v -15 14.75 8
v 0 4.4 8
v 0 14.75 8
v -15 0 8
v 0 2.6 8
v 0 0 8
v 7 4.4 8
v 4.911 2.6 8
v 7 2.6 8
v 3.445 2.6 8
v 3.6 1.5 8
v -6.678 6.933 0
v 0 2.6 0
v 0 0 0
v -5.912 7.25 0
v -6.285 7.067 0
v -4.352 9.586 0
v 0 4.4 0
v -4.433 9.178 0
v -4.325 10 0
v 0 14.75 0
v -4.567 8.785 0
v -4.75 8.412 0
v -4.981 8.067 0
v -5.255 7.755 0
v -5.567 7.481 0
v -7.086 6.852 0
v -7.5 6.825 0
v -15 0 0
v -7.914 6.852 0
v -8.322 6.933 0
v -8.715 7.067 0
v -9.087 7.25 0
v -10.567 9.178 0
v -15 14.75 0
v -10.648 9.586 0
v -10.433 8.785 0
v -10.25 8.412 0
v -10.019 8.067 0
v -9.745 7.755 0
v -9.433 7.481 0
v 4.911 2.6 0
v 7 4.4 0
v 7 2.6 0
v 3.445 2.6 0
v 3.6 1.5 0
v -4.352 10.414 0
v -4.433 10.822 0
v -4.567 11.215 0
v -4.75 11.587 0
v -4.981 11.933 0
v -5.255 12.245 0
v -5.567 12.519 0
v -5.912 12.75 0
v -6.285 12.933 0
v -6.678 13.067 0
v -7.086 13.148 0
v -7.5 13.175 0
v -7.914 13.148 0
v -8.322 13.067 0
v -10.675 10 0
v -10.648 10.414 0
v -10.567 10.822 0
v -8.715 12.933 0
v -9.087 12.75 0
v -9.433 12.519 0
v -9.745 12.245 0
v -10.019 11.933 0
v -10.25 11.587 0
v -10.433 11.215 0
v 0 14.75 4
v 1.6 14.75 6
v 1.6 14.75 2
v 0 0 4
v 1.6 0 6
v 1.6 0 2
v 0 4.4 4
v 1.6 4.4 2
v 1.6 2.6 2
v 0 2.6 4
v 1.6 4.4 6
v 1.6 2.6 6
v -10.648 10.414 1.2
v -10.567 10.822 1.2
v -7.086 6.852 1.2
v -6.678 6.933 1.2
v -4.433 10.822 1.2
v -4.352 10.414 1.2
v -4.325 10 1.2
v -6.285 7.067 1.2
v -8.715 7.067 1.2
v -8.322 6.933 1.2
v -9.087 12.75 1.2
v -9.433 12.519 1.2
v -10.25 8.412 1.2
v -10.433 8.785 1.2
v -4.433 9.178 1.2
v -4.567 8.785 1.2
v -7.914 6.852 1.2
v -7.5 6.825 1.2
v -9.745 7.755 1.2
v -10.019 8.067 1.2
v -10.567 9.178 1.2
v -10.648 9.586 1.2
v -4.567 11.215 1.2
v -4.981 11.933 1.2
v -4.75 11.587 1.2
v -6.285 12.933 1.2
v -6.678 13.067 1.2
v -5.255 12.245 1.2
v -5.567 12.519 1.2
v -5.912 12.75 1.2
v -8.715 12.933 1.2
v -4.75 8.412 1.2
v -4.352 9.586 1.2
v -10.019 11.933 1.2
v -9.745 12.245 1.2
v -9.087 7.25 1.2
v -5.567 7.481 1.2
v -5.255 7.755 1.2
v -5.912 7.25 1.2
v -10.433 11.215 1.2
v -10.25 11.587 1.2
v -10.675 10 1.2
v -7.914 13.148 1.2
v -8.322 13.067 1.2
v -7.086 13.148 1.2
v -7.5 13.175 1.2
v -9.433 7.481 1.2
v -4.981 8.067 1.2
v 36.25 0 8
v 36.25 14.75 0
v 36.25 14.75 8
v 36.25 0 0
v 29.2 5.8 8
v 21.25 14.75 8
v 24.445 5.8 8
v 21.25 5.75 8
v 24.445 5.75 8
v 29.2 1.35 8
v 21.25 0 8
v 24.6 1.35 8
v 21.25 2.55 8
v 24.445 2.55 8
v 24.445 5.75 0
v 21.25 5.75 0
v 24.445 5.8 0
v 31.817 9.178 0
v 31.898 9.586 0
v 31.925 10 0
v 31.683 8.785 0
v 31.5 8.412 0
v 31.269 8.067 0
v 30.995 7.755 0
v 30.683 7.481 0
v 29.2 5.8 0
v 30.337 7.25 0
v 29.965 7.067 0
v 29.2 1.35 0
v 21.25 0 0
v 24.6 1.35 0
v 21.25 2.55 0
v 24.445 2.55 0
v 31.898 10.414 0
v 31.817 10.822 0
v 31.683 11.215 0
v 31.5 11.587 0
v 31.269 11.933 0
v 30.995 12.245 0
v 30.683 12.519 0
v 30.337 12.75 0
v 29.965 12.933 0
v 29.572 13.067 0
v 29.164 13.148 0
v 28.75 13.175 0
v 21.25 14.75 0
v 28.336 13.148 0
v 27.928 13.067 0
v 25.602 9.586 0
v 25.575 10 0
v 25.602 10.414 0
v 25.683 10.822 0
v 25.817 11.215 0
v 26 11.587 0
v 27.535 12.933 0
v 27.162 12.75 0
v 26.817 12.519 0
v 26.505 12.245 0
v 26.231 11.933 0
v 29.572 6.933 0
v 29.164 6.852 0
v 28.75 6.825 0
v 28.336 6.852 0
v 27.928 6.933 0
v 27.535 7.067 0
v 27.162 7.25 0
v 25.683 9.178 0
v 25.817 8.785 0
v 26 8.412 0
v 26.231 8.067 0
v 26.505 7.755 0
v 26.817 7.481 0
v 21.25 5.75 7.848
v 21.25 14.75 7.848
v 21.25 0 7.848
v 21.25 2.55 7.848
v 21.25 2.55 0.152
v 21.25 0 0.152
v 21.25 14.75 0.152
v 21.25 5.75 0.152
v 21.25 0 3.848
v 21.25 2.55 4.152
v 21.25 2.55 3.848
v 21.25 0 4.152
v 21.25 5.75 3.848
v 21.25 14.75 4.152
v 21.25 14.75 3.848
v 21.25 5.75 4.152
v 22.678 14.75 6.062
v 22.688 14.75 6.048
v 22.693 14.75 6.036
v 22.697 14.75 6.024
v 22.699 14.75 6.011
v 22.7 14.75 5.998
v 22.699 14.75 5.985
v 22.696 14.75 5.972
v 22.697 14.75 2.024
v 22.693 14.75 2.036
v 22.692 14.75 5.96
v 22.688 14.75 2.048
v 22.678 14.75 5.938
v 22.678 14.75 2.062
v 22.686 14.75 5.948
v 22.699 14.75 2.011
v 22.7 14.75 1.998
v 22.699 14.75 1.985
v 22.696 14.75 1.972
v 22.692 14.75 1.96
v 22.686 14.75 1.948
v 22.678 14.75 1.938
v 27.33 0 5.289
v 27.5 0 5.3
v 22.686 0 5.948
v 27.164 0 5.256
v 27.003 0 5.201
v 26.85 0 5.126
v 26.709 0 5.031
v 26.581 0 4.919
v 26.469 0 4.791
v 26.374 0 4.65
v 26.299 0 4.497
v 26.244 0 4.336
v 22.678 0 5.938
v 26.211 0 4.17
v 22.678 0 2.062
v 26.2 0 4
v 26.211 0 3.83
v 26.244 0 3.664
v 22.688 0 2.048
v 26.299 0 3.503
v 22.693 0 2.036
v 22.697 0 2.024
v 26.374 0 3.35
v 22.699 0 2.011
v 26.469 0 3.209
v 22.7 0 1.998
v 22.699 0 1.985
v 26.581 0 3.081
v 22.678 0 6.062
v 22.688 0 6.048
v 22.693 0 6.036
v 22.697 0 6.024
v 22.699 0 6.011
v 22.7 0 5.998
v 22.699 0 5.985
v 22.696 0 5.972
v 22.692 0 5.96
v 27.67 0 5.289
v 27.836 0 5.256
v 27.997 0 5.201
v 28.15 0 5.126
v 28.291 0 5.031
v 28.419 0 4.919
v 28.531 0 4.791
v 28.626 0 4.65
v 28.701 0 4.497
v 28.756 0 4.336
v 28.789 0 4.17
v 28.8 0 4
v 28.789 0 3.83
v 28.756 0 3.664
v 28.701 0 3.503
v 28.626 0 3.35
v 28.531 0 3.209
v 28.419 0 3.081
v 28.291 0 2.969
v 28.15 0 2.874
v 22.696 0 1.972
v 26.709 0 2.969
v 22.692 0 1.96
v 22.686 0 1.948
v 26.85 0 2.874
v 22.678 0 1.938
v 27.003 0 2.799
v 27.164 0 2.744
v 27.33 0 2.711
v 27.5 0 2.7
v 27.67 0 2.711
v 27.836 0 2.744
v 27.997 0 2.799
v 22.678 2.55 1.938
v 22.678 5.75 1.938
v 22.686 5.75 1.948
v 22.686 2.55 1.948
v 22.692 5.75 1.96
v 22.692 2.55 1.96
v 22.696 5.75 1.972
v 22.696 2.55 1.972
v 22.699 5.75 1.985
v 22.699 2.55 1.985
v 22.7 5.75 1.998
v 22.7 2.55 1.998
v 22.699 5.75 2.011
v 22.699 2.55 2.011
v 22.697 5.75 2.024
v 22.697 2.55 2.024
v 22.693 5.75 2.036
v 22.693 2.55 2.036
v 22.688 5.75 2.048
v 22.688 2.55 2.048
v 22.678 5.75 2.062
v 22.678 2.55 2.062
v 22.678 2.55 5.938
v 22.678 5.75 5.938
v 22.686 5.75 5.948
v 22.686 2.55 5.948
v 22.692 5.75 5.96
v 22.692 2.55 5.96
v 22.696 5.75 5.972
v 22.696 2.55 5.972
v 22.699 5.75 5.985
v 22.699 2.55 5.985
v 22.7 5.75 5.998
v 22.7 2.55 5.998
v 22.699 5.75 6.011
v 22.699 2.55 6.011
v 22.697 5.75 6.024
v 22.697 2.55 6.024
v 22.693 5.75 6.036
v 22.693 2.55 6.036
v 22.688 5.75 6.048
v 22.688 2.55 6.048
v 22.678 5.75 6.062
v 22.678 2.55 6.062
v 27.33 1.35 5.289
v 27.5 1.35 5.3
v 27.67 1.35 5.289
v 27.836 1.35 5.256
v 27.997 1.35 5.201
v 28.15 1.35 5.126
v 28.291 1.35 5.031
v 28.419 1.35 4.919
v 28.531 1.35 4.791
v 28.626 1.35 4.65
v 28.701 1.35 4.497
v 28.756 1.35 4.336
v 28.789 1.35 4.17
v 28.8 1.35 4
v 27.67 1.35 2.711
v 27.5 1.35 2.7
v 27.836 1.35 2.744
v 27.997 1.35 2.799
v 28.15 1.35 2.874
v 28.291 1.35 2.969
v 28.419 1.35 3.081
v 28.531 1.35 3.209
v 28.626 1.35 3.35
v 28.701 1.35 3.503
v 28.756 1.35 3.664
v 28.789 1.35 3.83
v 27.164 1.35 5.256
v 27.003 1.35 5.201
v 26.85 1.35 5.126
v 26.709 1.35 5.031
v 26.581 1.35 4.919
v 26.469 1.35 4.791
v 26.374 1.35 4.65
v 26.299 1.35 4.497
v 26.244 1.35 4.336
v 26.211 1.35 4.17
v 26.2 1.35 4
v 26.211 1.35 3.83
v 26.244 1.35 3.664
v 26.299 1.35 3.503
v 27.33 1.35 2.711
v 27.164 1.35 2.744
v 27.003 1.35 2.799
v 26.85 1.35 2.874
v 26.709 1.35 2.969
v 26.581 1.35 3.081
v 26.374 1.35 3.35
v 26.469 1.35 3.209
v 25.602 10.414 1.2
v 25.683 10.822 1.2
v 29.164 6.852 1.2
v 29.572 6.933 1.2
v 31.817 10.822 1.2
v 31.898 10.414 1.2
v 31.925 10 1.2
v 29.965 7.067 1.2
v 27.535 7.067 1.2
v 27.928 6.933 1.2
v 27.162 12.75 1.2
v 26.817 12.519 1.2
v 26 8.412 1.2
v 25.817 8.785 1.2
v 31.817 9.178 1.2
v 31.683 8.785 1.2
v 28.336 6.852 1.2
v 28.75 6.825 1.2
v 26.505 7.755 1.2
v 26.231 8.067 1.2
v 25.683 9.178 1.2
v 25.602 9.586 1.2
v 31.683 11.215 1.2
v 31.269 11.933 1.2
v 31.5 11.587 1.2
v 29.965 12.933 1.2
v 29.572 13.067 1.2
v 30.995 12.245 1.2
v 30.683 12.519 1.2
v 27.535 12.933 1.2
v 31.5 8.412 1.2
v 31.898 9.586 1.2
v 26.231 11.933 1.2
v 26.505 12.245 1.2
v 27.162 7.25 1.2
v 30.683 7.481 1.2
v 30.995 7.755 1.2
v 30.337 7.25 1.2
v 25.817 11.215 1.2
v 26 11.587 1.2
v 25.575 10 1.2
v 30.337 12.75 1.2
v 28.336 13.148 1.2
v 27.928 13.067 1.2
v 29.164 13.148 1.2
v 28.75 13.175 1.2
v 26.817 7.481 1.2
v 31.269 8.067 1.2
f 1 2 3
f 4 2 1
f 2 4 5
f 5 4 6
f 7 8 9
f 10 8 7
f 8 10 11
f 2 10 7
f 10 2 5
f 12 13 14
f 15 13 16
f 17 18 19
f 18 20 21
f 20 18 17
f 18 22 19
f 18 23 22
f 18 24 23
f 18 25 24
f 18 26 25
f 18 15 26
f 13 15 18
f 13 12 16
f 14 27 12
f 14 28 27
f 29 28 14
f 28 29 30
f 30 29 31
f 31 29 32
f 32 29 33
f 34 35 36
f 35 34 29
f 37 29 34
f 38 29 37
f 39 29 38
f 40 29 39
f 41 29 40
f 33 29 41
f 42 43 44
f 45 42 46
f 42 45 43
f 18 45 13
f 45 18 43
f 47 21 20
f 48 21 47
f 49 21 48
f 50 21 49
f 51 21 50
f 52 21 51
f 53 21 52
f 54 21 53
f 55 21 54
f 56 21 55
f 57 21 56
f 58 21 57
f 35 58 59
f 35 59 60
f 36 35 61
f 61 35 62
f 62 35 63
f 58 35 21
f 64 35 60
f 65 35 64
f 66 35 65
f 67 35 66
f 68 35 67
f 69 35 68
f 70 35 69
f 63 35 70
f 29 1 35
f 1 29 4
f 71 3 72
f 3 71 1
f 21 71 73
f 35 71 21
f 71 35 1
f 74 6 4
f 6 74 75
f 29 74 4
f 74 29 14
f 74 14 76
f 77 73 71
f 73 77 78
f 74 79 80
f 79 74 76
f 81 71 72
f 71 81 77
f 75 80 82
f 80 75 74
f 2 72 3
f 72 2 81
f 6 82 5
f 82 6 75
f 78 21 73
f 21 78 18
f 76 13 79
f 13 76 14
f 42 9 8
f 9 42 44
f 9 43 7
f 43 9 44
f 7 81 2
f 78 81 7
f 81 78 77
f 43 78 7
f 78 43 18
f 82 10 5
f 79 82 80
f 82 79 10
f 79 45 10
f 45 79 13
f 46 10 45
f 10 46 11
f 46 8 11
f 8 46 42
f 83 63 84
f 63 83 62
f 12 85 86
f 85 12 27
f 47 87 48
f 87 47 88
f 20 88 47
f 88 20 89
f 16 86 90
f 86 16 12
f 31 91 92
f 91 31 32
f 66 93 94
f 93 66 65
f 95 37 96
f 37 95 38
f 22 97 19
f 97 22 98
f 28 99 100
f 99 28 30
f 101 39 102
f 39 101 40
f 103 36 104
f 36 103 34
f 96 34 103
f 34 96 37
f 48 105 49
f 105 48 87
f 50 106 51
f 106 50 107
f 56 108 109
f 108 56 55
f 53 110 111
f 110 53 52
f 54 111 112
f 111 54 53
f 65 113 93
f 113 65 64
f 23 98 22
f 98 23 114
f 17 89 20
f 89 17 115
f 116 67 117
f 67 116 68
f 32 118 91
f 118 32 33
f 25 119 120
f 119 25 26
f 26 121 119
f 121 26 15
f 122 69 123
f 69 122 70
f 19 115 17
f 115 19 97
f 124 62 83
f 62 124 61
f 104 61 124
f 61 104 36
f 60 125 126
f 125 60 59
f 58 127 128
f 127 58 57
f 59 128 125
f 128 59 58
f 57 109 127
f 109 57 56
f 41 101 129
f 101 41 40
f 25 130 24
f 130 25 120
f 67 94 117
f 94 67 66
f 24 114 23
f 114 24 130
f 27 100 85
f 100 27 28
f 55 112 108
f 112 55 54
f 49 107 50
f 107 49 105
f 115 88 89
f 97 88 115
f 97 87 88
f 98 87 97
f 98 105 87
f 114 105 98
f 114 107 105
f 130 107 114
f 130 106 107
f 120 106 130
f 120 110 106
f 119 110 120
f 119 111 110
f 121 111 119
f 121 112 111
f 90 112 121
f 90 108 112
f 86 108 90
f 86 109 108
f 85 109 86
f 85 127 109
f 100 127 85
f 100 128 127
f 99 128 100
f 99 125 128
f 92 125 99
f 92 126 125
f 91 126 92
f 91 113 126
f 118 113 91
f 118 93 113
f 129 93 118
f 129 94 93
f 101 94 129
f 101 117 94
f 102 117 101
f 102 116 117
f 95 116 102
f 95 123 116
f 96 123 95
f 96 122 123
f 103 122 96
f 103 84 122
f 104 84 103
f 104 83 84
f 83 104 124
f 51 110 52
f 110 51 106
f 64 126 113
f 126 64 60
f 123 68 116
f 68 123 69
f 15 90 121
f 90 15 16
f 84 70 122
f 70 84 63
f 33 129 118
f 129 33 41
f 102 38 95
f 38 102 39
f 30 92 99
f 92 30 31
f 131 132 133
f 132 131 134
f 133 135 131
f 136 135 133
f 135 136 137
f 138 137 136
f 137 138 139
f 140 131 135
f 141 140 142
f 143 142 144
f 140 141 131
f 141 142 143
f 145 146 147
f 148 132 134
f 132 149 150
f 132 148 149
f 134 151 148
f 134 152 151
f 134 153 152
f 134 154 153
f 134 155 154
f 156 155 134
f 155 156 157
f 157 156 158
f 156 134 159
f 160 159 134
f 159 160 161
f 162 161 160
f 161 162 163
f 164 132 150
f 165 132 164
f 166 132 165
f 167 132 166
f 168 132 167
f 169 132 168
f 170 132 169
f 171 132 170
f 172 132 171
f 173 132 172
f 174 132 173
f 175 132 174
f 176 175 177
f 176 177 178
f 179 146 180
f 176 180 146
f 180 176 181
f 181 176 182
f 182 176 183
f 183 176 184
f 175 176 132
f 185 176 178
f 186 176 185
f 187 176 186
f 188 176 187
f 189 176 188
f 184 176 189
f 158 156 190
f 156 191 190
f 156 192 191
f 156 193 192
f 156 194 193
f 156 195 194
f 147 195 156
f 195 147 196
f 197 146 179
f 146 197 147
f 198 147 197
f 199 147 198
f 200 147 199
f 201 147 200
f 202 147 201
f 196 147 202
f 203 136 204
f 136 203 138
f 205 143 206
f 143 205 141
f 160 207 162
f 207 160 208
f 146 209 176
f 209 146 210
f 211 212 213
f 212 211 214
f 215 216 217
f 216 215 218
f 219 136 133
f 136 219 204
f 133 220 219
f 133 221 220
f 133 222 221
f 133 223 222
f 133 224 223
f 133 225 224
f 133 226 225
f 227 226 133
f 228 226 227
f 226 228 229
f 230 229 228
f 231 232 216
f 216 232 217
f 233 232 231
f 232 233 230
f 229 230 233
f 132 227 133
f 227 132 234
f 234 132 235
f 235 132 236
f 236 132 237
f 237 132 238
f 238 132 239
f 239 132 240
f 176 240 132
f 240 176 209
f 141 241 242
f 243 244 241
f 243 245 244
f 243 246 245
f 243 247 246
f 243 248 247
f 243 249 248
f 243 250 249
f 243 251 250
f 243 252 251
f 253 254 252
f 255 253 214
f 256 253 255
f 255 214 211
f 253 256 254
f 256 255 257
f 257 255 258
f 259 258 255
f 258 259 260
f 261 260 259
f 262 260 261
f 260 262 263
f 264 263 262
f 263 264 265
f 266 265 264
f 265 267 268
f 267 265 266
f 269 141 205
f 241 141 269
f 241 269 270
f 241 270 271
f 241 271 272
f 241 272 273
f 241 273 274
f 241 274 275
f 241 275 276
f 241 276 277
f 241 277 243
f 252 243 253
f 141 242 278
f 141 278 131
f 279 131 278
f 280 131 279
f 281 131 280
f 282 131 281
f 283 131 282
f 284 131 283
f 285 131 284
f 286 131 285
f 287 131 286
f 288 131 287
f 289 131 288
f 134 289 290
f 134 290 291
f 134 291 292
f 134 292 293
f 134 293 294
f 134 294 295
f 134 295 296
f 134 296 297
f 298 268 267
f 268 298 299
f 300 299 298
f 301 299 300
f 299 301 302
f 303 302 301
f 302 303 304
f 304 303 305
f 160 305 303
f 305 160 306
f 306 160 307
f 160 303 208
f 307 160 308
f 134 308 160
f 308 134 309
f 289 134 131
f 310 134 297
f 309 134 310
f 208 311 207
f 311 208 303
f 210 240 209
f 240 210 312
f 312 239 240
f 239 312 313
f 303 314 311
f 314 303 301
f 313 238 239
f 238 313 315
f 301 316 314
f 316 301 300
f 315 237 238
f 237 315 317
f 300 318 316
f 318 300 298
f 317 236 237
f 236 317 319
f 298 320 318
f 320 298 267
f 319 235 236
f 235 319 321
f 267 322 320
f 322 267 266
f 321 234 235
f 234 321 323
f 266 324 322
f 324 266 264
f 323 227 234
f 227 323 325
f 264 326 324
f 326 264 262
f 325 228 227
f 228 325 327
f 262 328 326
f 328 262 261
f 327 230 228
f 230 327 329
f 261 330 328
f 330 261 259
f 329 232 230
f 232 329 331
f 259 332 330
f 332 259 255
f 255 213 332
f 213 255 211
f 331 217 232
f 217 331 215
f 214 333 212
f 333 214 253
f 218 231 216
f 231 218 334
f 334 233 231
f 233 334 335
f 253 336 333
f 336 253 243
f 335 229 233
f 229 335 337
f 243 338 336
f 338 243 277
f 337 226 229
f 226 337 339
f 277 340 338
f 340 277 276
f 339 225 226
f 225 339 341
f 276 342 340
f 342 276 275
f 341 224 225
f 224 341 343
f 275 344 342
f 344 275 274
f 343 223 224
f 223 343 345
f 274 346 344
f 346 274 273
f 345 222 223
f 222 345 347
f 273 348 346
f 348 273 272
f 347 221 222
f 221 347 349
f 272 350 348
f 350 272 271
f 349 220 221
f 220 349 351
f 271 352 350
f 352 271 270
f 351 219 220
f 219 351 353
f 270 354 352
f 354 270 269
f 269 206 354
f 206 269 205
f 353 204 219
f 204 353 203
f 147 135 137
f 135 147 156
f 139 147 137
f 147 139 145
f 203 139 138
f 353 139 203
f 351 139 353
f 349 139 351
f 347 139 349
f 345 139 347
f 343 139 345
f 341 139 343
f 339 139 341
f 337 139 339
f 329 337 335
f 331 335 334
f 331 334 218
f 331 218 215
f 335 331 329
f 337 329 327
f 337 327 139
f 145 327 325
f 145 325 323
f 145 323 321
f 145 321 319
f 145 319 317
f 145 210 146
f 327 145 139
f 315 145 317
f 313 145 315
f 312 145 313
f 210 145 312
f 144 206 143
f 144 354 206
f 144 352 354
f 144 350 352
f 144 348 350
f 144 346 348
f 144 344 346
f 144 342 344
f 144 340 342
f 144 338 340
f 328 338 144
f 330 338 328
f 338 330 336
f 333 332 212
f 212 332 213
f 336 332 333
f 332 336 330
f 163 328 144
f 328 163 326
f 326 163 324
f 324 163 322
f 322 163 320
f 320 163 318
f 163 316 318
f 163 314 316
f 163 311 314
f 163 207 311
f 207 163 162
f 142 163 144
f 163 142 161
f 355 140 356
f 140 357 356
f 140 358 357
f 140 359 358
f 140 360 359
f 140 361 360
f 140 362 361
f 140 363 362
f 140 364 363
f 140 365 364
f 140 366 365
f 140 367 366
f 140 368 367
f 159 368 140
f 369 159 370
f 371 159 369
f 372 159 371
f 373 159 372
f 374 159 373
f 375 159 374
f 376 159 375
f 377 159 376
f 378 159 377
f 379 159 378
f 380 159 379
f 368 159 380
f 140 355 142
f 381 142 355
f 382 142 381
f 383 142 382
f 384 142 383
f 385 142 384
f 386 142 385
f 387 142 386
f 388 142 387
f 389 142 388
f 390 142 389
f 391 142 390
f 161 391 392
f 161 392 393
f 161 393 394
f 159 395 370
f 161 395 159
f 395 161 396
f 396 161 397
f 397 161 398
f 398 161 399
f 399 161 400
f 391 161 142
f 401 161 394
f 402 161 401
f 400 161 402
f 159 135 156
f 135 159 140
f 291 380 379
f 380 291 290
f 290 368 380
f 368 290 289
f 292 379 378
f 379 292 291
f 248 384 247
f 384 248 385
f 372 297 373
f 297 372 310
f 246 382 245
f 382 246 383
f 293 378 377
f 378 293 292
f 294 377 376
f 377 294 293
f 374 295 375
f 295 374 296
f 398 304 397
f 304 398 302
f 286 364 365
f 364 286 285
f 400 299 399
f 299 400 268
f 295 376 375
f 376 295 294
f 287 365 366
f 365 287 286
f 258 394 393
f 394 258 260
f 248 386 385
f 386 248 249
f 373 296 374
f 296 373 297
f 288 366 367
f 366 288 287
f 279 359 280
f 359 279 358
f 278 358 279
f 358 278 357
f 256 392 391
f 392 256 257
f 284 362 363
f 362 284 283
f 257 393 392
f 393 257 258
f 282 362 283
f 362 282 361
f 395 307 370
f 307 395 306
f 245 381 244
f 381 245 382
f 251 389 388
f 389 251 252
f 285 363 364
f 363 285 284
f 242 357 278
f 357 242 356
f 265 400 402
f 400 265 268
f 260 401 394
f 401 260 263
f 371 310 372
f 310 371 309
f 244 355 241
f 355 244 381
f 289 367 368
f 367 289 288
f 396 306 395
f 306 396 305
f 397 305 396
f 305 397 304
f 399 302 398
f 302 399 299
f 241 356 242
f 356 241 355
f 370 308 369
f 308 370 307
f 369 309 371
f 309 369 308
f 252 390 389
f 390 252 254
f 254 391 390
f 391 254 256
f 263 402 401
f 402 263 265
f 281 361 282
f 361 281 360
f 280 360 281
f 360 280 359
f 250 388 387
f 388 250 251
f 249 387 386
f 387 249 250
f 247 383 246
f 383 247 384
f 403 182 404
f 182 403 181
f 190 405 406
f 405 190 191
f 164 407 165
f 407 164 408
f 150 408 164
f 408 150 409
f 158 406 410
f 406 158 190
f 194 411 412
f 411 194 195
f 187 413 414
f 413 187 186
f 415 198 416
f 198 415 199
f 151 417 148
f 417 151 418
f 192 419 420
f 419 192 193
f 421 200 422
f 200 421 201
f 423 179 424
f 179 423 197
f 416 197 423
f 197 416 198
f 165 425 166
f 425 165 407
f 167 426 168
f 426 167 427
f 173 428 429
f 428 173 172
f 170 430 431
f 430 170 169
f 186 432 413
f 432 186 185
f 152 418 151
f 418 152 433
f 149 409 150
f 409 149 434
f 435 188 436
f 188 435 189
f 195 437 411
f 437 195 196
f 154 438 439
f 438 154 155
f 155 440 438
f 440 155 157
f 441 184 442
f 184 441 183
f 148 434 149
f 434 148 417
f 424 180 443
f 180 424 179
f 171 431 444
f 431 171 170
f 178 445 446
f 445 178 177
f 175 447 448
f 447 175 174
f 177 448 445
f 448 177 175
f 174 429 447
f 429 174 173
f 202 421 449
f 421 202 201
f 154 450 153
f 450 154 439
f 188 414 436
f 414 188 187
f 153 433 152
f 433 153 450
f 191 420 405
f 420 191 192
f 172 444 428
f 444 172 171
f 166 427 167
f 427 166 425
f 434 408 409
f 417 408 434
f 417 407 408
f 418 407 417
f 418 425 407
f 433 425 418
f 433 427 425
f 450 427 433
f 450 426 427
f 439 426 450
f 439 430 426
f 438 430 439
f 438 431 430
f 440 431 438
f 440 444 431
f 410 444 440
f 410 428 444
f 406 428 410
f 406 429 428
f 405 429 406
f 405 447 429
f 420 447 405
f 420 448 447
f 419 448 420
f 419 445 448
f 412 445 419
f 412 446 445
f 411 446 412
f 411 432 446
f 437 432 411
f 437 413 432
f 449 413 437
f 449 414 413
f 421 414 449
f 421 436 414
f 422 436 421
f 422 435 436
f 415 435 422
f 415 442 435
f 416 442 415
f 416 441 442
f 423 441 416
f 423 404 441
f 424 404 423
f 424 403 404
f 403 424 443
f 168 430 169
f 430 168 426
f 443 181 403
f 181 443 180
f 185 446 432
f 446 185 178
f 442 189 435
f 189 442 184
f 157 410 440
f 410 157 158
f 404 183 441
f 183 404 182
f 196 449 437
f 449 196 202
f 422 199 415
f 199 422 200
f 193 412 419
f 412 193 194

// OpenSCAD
// abacus-link.scad — the AbacusLink modular-column joint + its test coupon
// ---------------------------------------------------------------------------
// SPEC: apps/web/docs/abacus-studio/modular-columns-spec.md
// TS MIRROR: src/components/create/abacus/abacus-link.ts (the derived chain and
// the fit guards; this file stays the source of truth for the GEOMETRY, exactly
// as abacus.scad does for the monolith).
//
// STATUS: unrendered. There is no headless OpenSCAD in this repo (see
// __tests__/export-defines.test.ts), so nothing here has been through the
// evaluator. Render `part="coupon"` in the studio or on the desktop before
// spending filament on it.
//
// WHY THIS IS A SEPARATE FILE. abacus.scad's captive-track geometry is the
// hardest-won thing in the model, and a seam never crosses a bead channel — so
// the joint can be designed, printed and measured entirely on its own. This
// file is that experiment. Once the coupon passes §9 of the spec, these modules
// get `include`d by abacus.scad rather than copied into it.
//
// THE ORIENTATION CONSTRAINT that shapes every decision below: the beads are
// captive and print in place, so the build orientation is FLAT (frame bottom on
// the bed) and is not negotiable. Therefore:
//   - anything prismatic in Z is free            (vertical walls print perfectly)
//   - anything within 45° of vertical is free    (self-supporting)
//   - anything else needs support, and support inside a snap fit is not a thing
// The chevron obeys the second rule; the latch obeys the first. Neither needs a
// single support interface.
//
// FRAME. The seam plane is x = 0. Module A is at x < 0 and presents the MALE
// face (chevron ridge + latch tongue, both reaching into +x). Module B starts at
// x = link_relief and presents the FEMALE face (chevron groove + latch slot).
// Every module is male on its right and female on its left, so they chain and
// the stack is loaded from one end. y runs from the outer wall at y = 0 inward;
// z is the slab height.
//
// ONE TONGUE PER STATION, NOT TWO. Doubling the tongues would double the clamp,
// but the release poke has to reach a tongue from the outer wall, and the second
// tongue's shoulder is exactly the material the second bore would have to drill
// through. So a seam gets two tongues by having two STATIONS — one at the front
// strip released from the front wall, one at the back strip released from the
// back wall. That is also what makes release two-handed, and two-handed is what
// makes it impossible by accident.

/* ===== the interface — FROZEN once a size class ships ===================== */
link_h        = 8;     // seam height = frame_h · S
link_pitch    = 15;    // modular col_pitch: bead 10 + 2·clearance + web 4.5
link_station  = 14.75; // Y depth of the station this coupon models (front strip)
                       // = border_w 7.0 + shelf 7.75. The monolith's 5.25 border
                       // gives a 13.0 strip, and 13.0 holds a latch OR a foot,
                       // not both — the foot-vs-slot assert below is what found
                       // that. Modular mode buys the extra 1.75 by widening the
                       // border, at +3.5 mm on the abacus's overall depth.

/* ---- chevron: Z registration and Z shear --------------------------------- */
// Two teeth across the height. The flank angle off vertical is
// atan(link_tooth_d / (link_h/link_teeth/2)) = 38.7° at these values — inside
// the 45° self-support limit with 6.3° to spare, in BOTH the ridge and the
// groove. Push link_tooth_d past link_h/(2·link_teeth) and the groove roof
// becomes an unprintable overhang; that is what the first assert is for.
link_teeth    = 2;
link_tooth_d  = 1.6;   // ridge protrusion into +x
link_back     = 0.6;   // profile backing, buried in A — keeps the polygon simple
link_fit      = 0.10;  // per-face groove clearance (what lets it go together)
link_relief   = 0.25;  // flat-face standoff: the chevron flanks are the ONLY
                       // contact, so nothing else can hold them off their seat

/* ---- cam latch: X preload, take-up, retention ---------------------------- */
// A cantilever along X springing in Y, prismatic in Z over the full height —
// support-free by construction, and 8 mm tall, so it is stiff about the axis
// that matters and compliant about the one it needs to be.
//
// The barb's proximal face is a ramp at link_ramp off the Y axis. That single
// angle does three jobs: it converts the spring's Y force into X clamp at
// 1/tan(ramp), it drives the seam shut so the ASSEMBLED clearance is zero
// whatever the manufactured clearance was, and — being below the PLA-on-PLA
// friction angle (~16.7°) — it self-locks, so load cannot back it out.
link_ramp     = 8;     // cam/retain ramp, degrees off the Y axis. SELF-LOCKING
                       // REQUIRES < ~16.7. Coupon sweep: 8 / 12 / 16.
link_lead     = 40;    // insertion lead-in, degrees off the X axis (shallow, so
                       // pushing two modules together is a kid-force operation)
link_beam_t   = 1.8;   // tongue thickness in Y
link_beam_l   = 12;    // tongue length in X — the stress lever. Shortening this
                       // raises clamp force as 1/L³ but beam stress as 1/L²;
                       // 12 mm keeps peak fibre stress ≈ 30 MPa, under PLA yield.
link_beam_x0  = -5;    // tongue root, inside A
link_beam_y0  = 2.6;   // tongue's near face, measured from the outer wall. The
                       // barb reaches 0.9 nearer still, so this sets the outer
                       // wall's remaining thickness (1.55 mm) — the wall the
                       // release bore goes through.
link_bump     = 1.1;   // barb height = the cam travel = the tolerance the joint
                       // can swallow (take-up = link_bump · tan(link_ramp)).
                       // NOTE the preload a seated seam holds comes from the
                       // travel REMAINING when the chevron bottoms — nominally
                       // half of this — not from the full height. The full
                       // height is the insertion peak. See linkMechanics().
link_slot     = 1.4;   // spring room on the tongue's far side. MUST exceed
                       // link_bump or the barb cannot deflect past the throat.
link_release  = 2.6;   // release-poke bore through the outer wall

/* ---- per-module stick-on foot -------------------------------------------- */
// Affordance, not obligation (spec §5): every module gets the pocket, you stick
// feet on as many as you want.
//
// The foot and the latch slot compete for the same strip, and the slot wins on
// X — it runs from the seam out to x = 8.2 of a 15 mm pitch, which leaves less
// clear width than even the smallest bumper needs. So they are separated in Y
// instead: latch inboard-of-the-wall, foot inboard of the latch. That is what
// sets link_station, and it caps the preset at 1/4" — the largest BUMPER_PRESETS
// entry that fits behind the slot in a widened strip.
link_foot     = true;
link_foot_w   = 6.35;  // 1/4"
link_foot_d   = 1.2;
link_foot_x   = 7.5;   // module-local — centred, since Y is what separates it
link_foot_y   = 10.0;

part = "coupon";       // coupon | male | female | assembled | ridge
$fn  = 48;

/* ===== derived ============================================================ */
link_th       = link_h / link_teeth;                  // one tooth's height
link_flank    = atan(link_tooth_d / (link_th / 2));   // chevron flank, off VERTICAL
link_beam_x1  = link_beam_x0 + link_beam_l;           // tongue tip
link_barb_x   = link_beam_x1 - 3.4;                   // where the barb bears
link_cam_run  = link_bump * tan(link_ramp);           // cam face's x-run
link_lead_run = link_bump / tan(link_lead);           // lead-in face's x-run
link_takeup   = link_cam_run;                         // X drawn per full travel
link_slot_end = link_beam_x1 + 1.2;                   // slot's far wall
link_bore_x   = link_beam_x1 - 0.5;                   // bore lands PAST the barb
// The two footprints that have to stay out of each other's way, as bounding
// boxes in the module's own frame: [x0, y0, x1, y1].
link_slot_bb  = [link_relief - 0.1,       link_beam_y0 - link_bump - 0.15,
                 link_slot_end,           link_beam_y0 + link_beam_t + link_slot];
link_foot_bb  = [link_foot_x - link_foot_w / 2, link_foot_y - link_foot_w / 2,
                 link_foot_x + link_foot_w / 2, link_foot_y + link_foot_w / 2];

/* ===== coherence floors =================================================== */
assert(link_tooth_d <= link_th / 2 + 0.001,
       "chevron flank steeper than 45° — the groove roof needs support. Lower link_tooth_d or raise link_teeth.");
assert(link_ramp > 0 && link_ramp < 16.7,
       "cam ramp outside the self-locking band (0 < ramp < atan(mu_PLA) ~ 16.7°)");
// Closing a link_fit normal gap on a flank inclined link_flank off vertical
// costs link_fit / cos(link_flank) of X travel. The flats have to stay clear of
// each other over at least that much, or they bottom out first and the chevron
// never seats — which loses the Z registration the markers depend on, silently.
assert(link_relief > link_fit / cos(link_flank) + 0.05,
       "flat relief too small — the seam faces would bottom out before the chevron flanks seat");
assert(link_takeup >= 0.12,
       "cam take-up under 0.12 mm cannot swallow a normal print's spread — raise link_bump or link_ramp");
assert(link_slot > link_bump + 0.2,
       "slot narrower than the barb's travel — the tongue would bind on insertion");
// The bore has to open into the slot BEYOND the shoulder. Drill it at or before
// the barb and it removes the very material the barb bears on — which is a
// silent failure: the part renders, prints, clicks, and holds nothing.
assert(link_bore_x - link_release / 2 > link_barb_x + link_lead_run,
       "release bore would eat the latch shoulder — move link_bore_x toward the tongue tip");
assert(link_beam_y0 - link_bump > 1.2,
       "outer wall left in front of the barb is thinner than a printable wall — raise link_beam_y0");
assert(link_slot_bb[3] < link_station,
       "latch slot runs past the station into the bead channel — raise link_station or shrink the tongue");
// Foot vs. latch. These two want the same strip, and the slot wins on X (it
// spans the seam out to link_slot_end, leaving less clear width than any bumper
// needs), so the only way past each other is Y. Stated as a real box-disjoint
// test rather than a one-axis check, because a one-axis check is what would let
// a future pitch/preset change quietly reintroduce the overlap.
link_bb_clear = 0.8;
assert(link_foot_bb[1] > link_slot_bb[3] + link_bb_clear ||
       link_foot_bb[3] < link_slot_bb[1] - link_bb_clear ||
       link_foot_bb[0] > link_slot_bb[2] + link_bb_clear ||
       link_foot_bb[2] < link_slot_bb[0] - link_bb_clear,
       "foot pocket overlaps the latch slot — move link_foot_y past the slot, shrink link_foot_w, or widen the station");
assert(link_foot_bb[0] > link_relief + 0.8 && link_foot_bb[2] < link_relief + link_pitch - 0.8 &&
       link_foot_bb[1] > 0.8 && link_foot_bb[3] < link_station - 0.8,
       "foot pocket runs off the module's solid strip — smaller link_foot_w, or a bigger pitch/station");

/* ===== chevron ============================================================ */
// XZ profile of the ridge, sitting on the seam plane: flat back buried in A,
// teeth reaching into +x. `each` is deliberately avoided so this parses on
// older evaluators.
function link_ridge_pts() = concat(
  [[-link_back, 0], [0, 0]],
  [for (i = [0 : 2 * link_teeth - 1]) let (k = floor(i / 2))
     i % 2 == 0 ? [link_tooth_d, (k + 0.5) * link_th] : [0, (k + 1) * link_th]],
  [[-link_back, link_h]]);

// Cross-section in X-Z, extruded along Y — the same helper shape as
// abacus.scad's prism_xz, so the two files stay idiomatically identical.
module link_prism_xz(pts, y0, y1, grow = 0)
  translate([0, (y0 + y1) / 2, 0])
    rotate([90, 0, 0])
      linear_extrude(height = y1 - y0, center = true)
        offset(r = grow) polygon(pts);

module link_ridge(y0, y1)  link_prism_xz(link_ridge_pts(), y0, y1);
// The groove is the ridge grown by link_fit on every face — so the ridge floats
// free until the cam pulls it in and the FLANKS bear, which is what centres the
// two modules in Z and makes the top faces flush by construction rather than by
// tolerance. Overshot in Y so the cut breaks cleanly out of both station ends.
module link_groove(y0, y1) link_prism_xz(link_ridge_pts(), y0 - 0.1, y1 + 0.1, link_fit);

/* ===== cam latch ========================================================== */
// Everything here is a plan-view (XY) profile extruded through the full height:
// no overhang exists anywhere in the latch, at any angle.
//
// The barb protrudes in −y and the slot's shoulder is the B material at −y, so
// disengaging pushes the tongue +y — i.e. INWARD from the outer wall at y = 0,
// which is the one direction a poke can reach an interior column from.
module link_tongue_2d() {
  y = link_beam_y0;
  union() {
    translate([link_beam_x0, y]) square([link_beam_l, link_beam_t]);
    // barb: cam face on the −x side (short and steep — that IS the mechanical
    // advantage), insertion lead-in on the +x side (long and shallow). As the
    // barb travels −y the face's x grows, so the spring draws A into B.
    polygon([[link_barb_x - link_cam_run,  y],
             [link_barb_x,                 y - link_bump],
             [link_barb_x + link_lead_run, y]]);
  }
}

// The slot: a throat only as wide as the bare tongue, so the barb must deflect
// to pass it, then an opening past the shoulder where the barb springs home.
// The shoulder face is cut on the same ramp as the barb's, so they bear flat.
module link_slot_2d() {
  y = link_beam_y0;
  union() {
    translate([link_relief - 0.1, y - 0.05])
      square([link_barb_x - link_relief + 0.1, link_beam_t + link_slot]);
    polygon([[link_barb_x - link_cam_run, y - 0.05],
             [link_barb_x,                y - link_bump - 0.15],
             [link_slot_end,              y - link_bump - 0.15],
             [link_slot_end,              y + link_beam_t + link_slot],
             [link_barb_x - link_cam_run, y + link_beam_t + link_slot]]);
  }
}

module link_tongue() linear_extrude(link_h) link_tongue_2d();
module link_slot()   linear_extrude(link_h) link_slot_2d();

// Release bore: from the outer wall at y = 0, in +y, onto the tongue's TIP —
// past the barb, so it opens into slot void instead of into the shoulder. Poke
// with a pencil, a paperclip, or the AbacusLink key, and the tongue lifts off
// its shoulder. One bore per station; a real module is released by squeezing
// the front and back bores together.
module link_release_bore()
  translate([link_bore_x, -0.1, link_h / 2])
    rotate([-90, 0, 0])
      cylinder(h = link_beam_y0 + 0.5, d = link_release);

/* ===== foot pocket ======================================================== */
// Straight-walled, not the monolith's dovetail: this one is only ever a seat for
// an adhesive bumper, and a module has no room to spare around it.
module link_foot_pocket(x)
  translate([x, link_foot_y, -0.01])
    cylinder(h = link_foot_d + 0.01, d = link_foot_w);

/* ===== the two coupon halves ============================================== */
// Each is a plain block of one column pitch carrying one real interface, so what
// the coupon measures is what the abacus gets. A is male on its right face, B is
// female on its left — the same handedness every module has. Module-local x is
// measured from each block's own female (left) face.
module link_male_half() {
  difference() {
    union() {
      translate([-link_pitch, 0, 0]) cube([link_pitch, link_station, link_h]);
      link_ridge(0, link_station);
      link_tongue();
    }
    if (link_foot) link_foot_pocket(-link_pitch + link_foot_x);
  }
}

module link_female_half() {
  difference() {
    translate([link_relief, 0, 0]) cube([link_pitch, link_station, link_h]);
    link_groove(0, link_station);
    link_slot();
    link_release_bore();
    if (link_foot) link_foot_pocket(link_relief + link_foot_x);
  }
}

/* ===== dispatch =========================================================== */
if (part == "male")           link_male_half();
else if (part == "female")    link_female_half();
else if (part == "ridge")     link_ridge(0, link_station);
else if (part == "assembled") {                         // preview only — the two
  link_male_half();                                     // halves in their seated
  link_female_half();                                   // pose, relief gap visible
}
else {                                                  // "coupon": print pose —
  link_male_half();                                     // both halves flat on the
  translate([link_pitch + 6, 0, 0]) link_female_half(); // bed, clear of each other
}
